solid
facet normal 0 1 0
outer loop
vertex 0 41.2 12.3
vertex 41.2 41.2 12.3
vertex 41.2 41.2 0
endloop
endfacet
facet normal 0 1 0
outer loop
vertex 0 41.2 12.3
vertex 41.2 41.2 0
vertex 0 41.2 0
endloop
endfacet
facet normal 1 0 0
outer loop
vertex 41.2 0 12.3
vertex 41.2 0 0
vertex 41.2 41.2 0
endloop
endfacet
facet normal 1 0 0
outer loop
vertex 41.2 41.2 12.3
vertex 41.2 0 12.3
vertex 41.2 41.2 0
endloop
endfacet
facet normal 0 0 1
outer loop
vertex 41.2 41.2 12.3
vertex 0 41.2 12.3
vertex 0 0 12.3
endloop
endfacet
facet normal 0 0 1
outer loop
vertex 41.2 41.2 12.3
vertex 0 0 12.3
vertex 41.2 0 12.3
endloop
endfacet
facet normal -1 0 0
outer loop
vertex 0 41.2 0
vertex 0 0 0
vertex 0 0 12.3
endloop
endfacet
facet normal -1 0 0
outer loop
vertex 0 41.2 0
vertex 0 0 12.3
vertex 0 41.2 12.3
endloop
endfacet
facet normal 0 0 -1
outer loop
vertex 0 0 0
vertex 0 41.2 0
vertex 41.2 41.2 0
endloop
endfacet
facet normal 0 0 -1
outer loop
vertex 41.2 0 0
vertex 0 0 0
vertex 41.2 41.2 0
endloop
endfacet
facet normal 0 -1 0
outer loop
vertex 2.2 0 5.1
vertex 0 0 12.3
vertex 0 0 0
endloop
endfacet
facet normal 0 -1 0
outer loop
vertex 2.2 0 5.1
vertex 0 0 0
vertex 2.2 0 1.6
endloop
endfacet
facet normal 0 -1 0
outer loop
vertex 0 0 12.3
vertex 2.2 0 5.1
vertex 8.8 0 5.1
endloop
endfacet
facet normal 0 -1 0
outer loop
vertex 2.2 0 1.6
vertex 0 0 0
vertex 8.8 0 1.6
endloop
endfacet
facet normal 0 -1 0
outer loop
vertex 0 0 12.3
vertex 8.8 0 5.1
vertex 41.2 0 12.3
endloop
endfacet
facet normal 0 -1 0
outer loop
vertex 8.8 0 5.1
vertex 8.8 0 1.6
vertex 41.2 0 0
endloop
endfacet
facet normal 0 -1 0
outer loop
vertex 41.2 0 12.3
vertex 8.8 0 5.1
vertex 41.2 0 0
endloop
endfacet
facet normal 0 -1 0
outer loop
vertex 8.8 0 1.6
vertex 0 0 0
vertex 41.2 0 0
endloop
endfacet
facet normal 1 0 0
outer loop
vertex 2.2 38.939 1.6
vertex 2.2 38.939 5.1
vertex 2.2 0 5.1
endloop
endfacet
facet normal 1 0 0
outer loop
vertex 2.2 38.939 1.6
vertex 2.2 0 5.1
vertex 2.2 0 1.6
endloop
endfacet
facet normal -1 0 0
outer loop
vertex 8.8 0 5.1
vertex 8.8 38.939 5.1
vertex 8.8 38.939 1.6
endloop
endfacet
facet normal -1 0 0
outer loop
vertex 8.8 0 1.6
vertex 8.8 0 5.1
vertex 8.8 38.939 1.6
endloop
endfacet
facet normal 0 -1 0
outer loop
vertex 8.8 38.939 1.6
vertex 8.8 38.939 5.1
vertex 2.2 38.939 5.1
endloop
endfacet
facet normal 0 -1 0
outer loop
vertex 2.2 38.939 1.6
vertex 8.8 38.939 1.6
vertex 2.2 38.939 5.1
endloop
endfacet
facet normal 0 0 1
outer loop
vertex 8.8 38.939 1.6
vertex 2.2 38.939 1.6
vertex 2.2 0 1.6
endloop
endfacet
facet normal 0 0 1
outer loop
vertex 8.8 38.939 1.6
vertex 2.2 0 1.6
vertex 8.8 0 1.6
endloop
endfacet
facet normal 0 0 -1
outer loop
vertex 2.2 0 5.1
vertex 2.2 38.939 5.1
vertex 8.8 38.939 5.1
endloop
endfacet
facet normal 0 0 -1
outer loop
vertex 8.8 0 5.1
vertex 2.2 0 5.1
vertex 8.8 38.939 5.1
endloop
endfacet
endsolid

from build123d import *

# Parameters (mm, degrees)
SCHIZZO1_W                   = 41.2
SCHIZZO1_H                   = 41.2
ESTRUSIONE_ESTRUSIONE1_DEPTH = 12.3
SCHIZZO2_W                   = 6.6
SCHIZZO2_H                   = 3.5
TAGLIO_ESTRUSIONE1_DEPTH     = 42
SCHIZZO3_W                   = 6.6
SCHIZZO3_H                   = 2.261378951
ESTRUSIONE_ESTRUSIONE2_DEPTH = 5


with BuildPart() as part:
    # Schizzo1 → Estrusione-Estrusione1 (new body)
    with BuildSketch(Plane.XY):
        with Locations((20.6, 20.6)):
            Rectangle(SCHIZZO1_W, SCHIZZO1_H)
    extrude(amount=ESTRUSIONE_ESTRUSIONE1_DEPTH)

    # Schizzo2 → Taglio-Estrusione1 (cut)
    with BuildSketch(Plane(origin=(0, 41.2, 0), x_dir=(1, 0, 0), z_dir=(0, 1, 0))):
        with Locations((5.5, -3.35)):
            Rectangle(SCHIZZO2_W, SCHIZZO2_H)
    extrude(amount=-TAGLIO_ESTRUSIONE1_DEPTH, mode=Mode.SUBTRACT)

    # Schizzo3 → Estrusione-Estrusione2 (add)
    with BuildSketch(Plane(origin=(0, 0, 5.1), x_dir=(-1, 0, 0), z_dir=(0, 0, -1))):
        with Locations((-5.5, 40.069310525)):
            Rectangle(SCHIZZO3_W, SCHIZZO3_H)
    extrude(amount=ESTRUSIONE_ESTRUSIONE2_DEPTH)


solid = part.part
